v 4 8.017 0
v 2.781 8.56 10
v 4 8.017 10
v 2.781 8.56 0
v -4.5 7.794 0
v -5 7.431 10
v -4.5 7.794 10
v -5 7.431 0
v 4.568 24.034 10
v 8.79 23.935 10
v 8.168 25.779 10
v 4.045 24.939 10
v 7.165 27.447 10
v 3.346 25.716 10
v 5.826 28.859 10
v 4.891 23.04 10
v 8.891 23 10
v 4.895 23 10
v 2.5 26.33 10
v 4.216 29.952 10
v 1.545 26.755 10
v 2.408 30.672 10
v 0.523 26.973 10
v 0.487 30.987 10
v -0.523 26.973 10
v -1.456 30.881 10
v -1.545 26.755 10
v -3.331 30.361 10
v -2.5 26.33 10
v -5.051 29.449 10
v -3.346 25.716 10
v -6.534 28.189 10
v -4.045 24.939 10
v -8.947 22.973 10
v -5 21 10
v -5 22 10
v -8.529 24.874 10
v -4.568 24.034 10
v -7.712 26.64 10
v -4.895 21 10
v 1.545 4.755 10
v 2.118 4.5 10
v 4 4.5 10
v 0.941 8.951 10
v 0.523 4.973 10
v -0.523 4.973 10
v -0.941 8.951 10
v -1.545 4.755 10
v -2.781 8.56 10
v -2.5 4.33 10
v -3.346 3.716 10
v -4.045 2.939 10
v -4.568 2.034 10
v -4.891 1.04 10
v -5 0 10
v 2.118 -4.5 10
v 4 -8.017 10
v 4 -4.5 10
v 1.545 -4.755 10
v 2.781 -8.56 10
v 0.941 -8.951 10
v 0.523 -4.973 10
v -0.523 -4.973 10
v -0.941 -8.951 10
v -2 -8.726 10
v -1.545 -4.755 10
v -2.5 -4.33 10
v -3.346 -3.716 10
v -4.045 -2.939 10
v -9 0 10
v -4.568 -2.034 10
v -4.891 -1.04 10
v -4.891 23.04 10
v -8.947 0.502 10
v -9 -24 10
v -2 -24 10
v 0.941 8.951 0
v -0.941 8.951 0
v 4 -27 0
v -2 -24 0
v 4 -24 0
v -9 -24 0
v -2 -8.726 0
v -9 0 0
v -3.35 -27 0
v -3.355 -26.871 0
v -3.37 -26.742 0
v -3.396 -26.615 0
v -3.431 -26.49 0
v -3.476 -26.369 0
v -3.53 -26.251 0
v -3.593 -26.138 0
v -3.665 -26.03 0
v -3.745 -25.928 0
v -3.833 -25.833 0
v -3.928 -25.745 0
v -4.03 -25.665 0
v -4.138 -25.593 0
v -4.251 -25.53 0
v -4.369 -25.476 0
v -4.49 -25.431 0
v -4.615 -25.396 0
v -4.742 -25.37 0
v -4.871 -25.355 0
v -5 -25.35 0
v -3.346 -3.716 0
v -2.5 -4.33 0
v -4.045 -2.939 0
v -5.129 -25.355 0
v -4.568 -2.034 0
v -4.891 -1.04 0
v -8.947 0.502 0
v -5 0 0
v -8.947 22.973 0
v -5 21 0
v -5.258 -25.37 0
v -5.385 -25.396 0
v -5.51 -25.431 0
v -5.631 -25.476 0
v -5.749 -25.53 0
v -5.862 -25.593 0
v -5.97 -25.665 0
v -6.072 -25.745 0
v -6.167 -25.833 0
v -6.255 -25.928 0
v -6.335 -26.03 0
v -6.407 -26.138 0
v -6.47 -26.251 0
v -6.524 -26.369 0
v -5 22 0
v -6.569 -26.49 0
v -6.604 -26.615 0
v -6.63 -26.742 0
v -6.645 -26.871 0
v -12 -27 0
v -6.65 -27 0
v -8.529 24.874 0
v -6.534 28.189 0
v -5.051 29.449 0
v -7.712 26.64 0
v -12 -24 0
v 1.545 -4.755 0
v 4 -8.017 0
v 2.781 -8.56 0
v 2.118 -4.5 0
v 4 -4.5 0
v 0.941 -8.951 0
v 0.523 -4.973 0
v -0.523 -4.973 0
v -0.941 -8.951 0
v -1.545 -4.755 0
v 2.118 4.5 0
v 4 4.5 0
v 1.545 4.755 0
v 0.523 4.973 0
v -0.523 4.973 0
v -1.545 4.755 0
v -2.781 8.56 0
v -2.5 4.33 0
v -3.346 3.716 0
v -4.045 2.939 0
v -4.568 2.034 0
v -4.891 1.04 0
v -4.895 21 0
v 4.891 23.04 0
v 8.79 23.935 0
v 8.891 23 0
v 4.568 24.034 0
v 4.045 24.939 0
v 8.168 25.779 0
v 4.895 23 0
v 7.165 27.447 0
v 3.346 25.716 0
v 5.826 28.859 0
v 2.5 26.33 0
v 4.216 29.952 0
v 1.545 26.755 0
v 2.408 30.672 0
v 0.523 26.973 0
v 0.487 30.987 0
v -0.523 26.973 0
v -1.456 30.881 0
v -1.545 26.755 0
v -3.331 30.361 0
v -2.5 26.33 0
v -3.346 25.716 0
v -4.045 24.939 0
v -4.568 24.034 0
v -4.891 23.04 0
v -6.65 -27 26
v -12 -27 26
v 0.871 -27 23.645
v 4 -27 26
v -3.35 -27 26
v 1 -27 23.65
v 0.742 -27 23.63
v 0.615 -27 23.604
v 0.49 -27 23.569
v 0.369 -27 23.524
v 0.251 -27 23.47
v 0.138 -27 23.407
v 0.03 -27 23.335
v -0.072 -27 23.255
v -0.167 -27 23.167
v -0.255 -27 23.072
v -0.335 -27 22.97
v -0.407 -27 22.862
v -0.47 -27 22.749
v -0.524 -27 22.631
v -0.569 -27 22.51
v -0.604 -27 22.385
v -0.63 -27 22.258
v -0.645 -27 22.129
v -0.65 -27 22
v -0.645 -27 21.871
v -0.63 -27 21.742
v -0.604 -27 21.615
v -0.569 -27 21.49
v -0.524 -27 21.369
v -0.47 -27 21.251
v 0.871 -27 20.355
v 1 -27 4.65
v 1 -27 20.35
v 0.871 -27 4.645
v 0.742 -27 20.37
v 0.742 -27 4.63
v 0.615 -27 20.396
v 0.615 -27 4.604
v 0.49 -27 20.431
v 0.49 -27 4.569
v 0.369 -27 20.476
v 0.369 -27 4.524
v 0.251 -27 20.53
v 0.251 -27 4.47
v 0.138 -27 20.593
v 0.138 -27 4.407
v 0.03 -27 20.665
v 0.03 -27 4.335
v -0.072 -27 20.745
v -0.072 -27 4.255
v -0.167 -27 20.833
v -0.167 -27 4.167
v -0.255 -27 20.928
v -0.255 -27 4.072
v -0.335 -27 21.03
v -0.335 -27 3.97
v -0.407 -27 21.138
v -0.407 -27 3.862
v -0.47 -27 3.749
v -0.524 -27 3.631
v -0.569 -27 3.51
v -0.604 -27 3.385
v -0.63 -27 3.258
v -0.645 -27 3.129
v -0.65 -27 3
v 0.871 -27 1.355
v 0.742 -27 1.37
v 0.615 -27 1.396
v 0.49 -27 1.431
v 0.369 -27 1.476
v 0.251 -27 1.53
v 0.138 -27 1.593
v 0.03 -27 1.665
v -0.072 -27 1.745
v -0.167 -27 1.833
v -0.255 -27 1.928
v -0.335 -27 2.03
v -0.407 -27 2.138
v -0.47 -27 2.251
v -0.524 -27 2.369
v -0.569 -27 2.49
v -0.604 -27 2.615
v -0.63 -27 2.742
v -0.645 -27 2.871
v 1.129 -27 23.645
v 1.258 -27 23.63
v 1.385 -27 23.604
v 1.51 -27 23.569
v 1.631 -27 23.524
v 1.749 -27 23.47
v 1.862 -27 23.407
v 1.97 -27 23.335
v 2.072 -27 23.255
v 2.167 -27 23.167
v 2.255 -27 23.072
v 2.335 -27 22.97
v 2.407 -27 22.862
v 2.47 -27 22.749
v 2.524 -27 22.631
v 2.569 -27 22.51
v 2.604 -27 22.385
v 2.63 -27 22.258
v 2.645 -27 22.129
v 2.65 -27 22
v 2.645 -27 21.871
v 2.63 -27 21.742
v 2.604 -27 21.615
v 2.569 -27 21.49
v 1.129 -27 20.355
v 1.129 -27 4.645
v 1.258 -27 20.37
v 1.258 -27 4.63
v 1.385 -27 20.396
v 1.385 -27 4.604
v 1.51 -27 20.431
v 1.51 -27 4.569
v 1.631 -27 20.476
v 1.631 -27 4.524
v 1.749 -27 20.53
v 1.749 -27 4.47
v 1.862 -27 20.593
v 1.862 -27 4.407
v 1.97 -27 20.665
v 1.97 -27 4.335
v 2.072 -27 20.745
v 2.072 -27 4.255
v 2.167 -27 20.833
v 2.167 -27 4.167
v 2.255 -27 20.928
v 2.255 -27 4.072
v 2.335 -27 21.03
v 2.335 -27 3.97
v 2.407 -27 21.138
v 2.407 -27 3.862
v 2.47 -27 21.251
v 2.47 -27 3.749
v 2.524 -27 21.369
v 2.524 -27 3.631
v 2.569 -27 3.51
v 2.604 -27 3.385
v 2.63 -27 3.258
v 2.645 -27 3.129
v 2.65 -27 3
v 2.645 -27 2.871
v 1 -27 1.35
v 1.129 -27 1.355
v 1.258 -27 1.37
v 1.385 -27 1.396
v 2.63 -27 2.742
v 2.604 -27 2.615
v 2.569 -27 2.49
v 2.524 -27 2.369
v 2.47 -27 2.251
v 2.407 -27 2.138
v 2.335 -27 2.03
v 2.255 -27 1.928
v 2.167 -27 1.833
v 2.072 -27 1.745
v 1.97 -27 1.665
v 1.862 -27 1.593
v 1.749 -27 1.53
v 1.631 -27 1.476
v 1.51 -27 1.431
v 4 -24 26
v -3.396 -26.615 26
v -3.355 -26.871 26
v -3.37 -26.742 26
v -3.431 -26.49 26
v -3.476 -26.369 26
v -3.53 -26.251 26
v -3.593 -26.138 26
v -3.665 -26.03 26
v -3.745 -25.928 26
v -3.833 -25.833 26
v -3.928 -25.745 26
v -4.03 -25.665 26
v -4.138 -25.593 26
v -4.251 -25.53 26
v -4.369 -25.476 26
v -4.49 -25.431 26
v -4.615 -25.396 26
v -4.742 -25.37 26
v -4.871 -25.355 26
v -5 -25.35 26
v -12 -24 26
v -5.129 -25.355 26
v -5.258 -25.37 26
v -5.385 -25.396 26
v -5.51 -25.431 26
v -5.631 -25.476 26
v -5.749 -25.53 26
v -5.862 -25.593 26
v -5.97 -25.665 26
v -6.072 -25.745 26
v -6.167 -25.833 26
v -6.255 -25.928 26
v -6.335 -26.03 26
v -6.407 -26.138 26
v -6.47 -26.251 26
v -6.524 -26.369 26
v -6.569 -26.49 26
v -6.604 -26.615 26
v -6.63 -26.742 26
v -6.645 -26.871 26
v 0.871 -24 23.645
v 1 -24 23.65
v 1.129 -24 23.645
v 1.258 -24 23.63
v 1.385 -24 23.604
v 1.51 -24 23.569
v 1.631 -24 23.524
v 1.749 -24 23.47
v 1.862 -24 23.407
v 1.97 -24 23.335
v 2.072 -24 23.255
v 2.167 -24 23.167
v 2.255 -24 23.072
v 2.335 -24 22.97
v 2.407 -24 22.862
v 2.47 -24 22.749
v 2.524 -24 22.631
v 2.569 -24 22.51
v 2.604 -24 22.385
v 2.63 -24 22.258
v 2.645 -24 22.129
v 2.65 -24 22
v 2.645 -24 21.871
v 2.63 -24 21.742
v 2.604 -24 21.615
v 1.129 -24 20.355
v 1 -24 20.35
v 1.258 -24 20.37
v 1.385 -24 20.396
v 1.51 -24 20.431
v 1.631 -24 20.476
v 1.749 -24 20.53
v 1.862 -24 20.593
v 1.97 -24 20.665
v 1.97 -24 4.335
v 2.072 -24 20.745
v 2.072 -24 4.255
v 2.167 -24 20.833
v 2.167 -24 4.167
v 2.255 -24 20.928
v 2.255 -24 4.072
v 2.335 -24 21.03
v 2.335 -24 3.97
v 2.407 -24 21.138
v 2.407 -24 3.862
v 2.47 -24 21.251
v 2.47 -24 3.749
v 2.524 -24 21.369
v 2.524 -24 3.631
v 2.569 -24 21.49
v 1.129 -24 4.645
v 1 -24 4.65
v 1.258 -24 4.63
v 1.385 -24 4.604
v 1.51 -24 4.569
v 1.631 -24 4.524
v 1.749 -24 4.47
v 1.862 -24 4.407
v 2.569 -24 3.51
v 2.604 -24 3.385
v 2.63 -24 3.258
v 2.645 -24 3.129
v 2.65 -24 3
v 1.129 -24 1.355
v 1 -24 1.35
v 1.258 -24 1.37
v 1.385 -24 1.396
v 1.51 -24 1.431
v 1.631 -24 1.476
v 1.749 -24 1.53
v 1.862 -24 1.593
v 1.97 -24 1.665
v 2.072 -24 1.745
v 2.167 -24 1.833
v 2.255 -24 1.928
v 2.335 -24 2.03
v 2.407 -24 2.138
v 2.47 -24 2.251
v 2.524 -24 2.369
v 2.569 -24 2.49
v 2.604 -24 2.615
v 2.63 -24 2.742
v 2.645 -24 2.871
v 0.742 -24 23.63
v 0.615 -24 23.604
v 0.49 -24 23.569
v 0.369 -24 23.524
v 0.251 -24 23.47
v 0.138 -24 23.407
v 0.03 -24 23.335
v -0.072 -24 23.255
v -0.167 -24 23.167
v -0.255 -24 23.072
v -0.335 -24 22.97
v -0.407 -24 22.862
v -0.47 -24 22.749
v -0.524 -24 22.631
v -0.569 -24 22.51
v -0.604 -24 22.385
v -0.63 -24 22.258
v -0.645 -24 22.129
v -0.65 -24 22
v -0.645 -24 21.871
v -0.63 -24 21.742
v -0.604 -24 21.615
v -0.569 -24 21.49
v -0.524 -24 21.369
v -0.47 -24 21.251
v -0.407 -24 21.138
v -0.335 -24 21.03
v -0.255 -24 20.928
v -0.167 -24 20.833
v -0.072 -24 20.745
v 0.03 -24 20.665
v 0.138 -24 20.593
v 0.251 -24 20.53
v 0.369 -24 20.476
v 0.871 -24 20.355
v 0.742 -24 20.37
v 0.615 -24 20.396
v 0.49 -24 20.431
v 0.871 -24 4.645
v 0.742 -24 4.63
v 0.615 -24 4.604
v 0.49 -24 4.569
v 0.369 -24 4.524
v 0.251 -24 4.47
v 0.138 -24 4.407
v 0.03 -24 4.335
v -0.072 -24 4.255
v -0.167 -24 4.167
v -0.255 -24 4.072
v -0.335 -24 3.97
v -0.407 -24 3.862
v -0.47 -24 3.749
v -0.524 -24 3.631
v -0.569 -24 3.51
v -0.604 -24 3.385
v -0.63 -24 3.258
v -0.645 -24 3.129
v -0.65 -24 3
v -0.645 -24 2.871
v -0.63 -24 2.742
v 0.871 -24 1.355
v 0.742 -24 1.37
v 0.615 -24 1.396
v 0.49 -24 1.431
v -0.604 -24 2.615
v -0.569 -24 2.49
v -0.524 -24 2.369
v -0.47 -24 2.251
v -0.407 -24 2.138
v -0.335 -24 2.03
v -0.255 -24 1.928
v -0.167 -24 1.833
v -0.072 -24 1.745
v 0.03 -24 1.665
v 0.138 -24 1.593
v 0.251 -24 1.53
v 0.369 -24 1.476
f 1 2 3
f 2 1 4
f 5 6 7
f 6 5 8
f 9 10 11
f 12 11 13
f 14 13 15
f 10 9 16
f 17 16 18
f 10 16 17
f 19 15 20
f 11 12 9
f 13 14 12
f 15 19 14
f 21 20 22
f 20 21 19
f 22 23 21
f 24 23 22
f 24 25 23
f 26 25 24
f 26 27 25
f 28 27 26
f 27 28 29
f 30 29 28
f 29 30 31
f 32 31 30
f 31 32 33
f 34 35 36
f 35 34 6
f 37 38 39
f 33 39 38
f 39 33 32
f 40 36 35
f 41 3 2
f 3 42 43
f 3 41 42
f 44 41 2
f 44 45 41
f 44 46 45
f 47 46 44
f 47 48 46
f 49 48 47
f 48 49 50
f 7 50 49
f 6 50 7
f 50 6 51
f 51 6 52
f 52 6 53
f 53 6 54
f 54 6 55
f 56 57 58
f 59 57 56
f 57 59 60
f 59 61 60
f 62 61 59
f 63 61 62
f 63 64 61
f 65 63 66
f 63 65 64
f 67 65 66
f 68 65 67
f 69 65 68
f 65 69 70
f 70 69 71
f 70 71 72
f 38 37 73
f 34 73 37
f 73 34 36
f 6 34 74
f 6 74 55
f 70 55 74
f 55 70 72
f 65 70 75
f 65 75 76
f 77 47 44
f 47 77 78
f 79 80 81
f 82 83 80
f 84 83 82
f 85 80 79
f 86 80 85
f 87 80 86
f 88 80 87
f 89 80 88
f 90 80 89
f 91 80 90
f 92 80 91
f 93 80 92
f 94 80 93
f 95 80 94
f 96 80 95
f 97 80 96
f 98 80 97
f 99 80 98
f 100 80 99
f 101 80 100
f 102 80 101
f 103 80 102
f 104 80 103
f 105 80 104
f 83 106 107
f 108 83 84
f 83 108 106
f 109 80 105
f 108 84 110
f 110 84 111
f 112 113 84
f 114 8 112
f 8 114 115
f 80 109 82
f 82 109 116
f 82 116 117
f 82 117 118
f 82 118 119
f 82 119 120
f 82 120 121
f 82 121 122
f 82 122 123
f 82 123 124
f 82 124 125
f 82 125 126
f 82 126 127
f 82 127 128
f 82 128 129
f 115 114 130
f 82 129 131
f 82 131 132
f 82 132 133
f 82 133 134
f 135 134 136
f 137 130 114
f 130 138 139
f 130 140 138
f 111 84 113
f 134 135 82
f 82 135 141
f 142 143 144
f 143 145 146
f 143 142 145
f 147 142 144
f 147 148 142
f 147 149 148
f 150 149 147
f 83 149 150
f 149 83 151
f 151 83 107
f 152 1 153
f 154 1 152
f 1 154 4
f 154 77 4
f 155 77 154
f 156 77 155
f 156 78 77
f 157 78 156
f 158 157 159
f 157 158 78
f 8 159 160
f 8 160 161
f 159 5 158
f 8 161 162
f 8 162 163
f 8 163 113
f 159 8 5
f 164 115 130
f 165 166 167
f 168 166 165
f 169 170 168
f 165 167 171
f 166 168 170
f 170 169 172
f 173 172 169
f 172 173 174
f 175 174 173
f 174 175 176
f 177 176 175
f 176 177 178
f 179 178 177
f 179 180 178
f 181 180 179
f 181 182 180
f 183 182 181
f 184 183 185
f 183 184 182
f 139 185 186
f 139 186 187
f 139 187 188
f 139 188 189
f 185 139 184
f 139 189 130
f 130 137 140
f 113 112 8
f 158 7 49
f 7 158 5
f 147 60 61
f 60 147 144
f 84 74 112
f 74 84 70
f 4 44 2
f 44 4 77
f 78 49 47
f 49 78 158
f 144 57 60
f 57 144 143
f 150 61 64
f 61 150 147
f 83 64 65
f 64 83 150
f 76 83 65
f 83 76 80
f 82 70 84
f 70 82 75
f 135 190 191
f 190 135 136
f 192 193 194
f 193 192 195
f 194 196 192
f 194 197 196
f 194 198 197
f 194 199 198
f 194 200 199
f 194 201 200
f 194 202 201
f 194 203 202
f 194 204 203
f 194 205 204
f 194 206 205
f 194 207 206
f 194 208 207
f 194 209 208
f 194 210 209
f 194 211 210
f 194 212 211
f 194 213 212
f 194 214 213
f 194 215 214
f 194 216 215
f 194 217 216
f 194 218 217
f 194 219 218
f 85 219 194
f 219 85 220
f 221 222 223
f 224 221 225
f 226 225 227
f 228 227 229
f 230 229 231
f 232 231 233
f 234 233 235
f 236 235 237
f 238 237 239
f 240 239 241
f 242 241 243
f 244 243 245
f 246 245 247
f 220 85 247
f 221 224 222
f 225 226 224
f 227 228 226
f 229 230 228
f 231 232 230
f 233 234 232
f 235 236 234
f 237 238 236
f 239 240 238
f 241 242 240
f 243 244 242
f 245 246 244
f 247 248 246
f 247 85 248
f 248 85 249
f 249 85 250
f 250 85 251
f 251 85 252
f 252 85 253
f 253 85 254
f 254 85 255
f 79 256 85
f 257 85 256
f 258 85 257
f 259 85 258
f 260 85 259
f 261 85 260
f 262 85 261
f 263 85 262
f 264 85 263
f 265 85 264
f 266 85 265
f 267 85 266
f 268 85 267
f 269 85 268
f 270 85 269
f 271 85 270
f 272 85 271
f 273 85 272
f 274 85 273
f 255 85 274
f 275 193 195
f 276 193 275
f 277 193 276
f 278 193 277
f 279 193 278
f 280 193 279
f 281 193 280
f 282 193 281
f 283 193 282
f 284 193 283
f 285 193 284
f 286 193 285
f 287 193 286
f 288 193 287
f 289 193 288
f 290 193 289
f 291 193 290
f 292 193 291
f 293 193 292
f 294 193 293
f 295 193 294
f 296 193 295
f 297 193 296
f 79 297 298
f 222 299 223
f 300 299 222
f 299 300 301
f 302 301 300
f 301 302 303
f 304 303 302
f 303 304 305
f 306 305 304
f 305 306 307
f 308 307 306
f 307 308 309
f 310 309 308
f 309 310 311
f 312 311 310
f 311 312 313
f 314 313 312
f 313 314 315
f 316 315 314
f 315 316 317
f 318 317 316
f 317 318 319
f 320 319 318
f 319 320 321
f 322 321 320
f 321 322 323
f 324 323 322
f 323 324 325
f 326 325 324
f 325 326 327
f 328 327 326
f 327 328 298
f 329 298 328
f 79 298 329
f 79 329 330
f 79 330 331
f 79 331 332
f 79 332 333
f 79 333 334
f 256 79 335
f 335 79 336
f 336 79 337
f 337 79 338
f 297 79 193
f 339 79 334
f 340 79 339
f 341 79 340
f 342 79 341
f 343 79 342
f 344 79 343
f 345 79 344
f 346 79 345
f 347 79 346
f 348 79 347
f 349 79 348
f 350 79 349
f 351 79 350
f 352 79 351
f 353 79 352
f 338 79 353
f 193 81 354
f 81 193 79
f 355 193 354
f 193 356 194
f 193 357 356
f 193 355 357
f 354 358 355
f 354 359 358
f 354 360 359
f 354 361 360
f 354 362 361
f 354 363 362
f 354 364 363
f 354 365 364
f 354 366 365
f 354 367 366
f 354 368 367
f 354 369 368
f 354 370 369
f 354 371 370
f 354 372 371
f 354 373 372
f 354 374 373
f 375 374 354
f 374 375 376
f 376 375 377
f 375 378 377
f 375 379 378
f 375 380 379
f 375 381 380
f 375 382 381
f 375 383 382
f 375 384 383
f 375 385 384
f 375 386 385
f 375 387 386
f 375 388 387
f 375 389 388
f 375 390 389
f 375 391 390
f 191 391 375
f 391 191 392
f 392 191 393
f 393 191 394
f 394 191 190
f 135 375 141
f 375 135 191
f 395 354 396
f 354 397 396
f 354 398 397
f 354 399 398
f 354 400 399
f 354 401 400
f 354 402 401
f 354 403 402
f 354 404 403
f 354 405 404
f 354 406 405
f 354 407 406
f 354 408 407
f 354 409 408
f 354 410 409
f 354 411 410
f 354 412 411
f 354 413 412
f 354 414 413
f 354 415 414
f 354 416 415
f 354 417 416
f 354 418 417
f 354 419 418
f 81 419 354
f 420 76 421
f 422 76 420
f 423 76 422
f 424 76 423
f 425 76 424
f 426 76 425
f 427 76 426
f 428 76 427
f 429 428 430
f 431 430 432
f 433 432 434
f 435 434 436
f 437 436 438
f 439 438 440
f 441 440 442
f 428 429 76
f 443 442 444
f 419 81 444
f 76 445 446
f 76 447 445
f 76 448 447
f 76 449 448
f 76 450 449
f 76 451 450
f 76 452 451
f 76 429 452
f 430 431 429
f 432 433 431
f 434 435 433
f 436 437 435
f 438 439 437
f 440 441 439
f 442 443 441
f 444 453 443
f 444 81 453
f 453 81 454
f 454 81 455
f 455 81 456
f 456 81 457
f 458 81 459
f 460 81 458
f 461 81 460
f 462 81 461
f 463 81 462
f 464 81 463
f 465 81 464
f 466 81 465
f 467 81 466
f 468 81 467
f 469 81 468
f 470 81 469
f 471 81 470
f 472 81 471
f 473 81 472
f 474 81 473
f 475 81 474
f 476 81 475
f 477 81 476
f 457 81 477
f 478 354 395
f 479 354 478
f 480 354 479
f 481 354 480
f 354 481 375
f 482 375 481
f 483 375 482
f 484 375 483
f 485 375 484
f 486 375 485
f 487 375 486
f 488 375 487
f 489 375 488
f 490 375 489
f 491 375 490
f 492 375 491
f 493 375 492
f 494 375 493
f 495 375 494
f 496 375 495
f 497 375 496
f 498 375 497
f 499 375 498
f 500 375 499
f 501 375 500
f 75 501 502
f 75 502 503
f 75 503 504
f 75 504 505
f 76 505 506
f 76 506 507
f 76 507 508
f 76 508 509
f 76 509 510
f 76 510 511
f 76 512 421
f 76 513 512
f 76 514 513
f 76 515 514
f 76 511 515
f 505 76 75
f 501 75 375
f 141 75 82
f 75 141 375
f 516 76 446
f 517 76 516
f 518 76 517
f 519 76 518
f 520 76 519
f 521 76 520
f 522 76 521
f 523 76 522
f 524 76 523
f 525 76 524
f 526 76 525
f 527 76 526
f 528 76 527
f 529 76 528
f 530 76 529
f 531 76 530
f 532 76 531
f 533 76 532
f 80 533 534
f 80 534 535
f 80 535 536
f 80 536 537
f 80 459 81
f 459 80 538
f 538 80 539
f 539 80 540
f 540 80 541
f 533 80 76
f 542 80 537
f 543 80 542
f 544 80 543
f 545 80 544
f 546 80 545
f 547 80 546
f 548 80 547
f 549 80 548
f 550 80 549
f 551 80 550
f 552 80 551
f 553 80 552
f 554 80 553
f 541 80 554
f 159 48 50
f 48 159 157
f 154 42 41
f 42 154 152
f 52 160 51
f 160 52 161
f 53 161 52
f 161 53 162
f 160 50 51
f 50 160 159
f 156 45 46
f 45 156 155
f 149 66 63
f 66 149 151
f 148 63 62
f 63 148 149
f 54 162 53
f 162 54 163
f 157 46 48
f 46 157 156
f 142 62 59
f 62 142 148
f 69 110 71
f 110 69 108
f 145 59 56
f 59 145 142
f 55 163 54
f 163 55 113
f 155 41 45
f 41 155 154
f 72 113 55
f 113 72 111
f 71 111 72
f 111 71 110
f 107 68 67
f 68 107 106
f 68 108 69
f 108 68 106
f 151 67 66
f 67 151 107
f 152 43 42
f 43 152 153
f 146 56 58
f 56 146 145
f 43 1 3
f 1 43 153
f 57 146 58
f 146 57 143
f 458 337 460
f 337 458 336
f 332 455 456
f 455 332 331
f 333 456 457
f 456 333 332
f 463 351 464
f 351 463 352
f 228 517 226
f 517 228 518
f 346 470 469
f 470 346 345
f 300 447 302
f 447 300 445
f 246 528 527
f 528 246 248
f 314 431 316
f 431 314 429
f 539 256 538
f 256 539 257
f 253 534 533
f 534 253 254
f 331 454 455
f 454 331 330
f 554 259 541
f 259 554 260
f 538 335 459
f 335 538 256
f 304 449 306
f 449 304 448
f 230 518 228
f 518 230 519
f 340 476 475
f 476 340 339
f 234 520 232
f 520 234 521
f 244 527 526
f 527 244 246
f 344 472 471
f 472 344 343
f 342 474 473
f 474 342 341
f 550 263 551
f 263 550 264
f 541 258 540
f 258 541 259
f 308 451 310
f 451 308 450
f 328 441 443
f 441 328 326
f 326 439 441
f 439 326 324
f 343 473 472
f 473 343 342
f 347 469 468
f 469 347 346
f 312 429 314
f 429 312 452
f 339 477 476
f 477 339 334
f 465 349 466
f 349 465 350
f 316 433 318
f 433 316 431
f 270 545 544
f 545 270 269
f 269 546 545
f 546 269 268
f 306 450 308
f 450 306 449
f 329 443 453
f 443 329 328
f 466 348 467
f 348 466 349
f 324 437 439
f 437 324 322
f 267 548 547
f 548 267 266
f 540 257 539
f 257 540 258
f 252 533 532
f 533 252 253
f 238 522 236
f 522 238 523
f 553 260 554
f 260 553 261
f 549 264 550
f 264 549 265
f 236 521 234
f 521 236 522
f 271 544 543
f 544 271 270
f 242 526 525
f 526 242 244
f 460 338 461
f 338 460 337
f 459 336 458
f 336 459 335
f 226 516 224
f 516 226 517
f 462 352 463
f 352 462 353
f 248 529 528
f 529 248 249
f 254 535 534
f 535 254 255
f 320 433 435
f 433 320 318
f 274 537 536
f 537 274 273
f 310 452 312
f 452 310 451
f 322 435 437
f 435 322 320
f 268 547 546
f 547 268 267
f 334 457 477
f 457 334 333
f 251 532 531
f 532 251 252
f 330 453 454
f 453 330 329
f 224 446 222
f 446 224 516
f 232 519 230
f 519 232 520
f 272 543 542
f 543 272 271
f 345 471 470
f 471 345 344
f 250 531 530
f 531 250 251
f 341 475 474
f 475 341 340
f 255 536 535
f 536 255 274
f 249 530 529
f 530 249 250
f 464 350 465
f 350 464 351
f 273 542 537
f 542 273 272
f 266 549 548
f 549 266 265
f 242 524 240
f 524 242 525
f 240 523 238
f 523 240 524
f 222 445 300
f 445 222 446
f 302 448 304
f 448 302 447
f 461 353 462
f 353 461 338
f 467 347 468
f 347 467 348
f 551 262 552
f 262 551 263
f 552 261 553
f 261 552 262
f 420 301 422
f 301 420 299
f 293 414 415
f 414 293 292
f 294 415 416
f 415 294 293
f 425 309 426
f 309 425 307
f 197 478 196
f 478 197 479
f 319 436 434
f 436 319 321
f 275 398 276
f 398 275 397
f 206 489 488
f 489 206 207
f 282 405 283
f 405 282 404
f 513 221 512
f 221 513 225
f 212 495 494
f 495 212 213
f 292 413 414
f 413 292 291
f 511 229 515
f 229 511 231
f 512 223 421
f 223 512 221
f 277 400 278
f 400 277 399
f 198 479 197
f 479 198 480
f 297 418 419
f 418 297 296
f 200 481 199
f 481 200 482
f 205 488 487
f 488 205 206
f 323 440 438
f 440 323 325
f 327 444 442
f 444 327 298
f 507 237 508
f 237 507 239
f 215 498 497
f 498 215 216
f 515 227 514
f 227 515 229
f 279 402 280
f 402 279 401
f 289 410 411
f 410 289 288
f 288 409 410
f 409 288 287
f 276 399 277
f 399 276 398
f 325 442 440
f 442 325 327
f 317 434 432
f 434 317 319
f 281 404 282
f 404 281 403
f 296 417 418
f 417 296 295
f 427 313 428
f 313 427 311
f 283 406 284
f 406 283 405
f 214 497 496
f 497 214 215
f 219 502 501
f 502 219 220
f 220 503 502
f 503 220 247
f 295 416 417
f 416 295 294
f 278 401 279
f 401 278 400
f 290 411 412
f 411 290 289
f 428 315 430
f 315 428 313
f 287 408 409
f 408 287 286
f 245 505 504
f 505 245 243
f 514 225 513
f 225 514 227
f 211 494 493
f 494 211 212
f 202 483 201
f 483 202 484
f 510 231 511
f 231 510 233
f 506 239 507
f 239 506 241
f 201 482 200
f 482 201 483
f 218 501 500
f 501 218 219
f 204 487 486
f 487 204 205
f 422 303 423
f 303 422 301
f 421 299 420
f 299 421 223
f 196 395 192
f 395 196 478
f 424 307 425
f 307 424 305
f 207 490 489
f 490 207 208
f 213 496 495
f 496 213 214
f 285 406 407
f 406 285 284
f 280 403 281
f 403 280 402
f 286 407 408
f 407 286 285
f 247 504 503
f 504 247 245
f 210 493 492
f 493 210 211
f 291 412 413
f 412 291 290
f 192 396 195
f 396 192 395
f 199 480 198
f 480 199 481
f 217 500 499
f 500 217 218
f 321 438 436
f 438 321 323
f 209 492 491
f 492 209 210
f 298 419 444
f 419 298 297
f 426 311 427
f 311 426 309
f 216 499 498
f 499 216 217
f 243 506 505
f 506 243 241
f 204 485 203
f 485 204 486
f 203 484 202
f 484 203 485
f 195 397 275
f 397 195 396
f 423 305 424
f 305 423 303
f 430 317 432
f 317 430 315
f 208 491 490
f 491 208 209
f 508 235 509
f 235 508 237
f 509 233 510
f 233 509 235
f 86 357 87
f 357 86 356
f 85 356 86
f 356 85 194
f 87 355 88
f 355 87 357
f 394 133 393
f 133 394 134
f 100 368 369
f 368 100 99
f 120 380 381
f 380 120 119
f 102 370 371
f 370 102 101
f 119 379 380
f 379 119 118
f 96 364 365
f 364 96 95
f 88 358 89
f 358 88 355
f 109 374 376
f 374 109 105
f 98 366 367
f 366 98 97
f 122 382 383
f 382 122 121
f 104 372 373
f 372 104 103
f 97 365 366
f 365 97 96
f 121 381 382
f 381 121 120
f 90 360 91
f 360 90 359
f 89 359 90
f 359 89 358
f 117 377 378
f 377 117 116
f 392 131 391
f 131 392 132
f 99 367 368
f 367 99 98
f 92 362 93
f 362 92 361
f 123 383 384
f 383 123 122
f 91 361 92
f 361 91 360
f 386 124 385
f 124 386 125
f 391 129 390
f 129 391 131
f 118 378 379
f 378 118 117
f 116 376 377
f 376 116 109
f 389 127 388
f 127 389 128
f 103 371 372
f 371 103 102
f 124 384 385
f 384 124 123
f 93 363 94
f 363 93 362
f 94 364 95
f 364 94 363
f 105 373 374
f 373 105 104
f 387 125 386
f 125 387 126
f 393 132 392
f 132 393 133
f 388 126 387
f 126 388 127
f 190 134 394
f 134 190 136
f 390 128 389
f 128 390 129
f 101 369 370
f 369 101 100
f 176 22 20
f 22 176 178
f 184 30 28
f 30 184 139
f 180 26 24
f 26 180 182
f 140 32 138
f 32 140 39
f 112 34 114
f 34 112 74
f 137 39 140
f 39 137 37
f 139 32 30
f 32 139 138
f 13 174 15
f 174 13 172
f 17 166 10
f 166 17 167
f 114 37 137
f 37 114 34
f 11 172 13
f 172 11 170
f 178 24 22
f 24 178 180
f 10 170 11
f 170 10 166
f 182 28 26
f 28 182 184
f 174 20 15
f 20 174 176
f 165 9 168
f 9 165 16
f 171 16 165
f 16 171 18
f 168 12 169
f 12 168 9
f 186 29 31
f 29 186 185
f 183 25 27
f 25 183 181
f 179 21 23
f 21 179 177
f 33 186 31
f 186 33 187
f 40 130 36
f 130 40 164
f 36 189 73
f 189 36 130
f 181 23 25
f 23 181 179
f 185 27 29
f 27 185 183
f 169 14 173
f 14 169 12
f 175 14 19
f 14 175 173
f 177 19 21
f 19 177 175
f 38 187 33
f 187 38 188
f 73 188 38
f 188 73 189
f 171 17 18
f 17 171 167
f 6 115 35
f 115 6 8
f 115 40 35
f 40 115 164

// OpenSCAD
// file: inc/rrd-switch.scad
module rrd_switch()
{
  $fn=80;
  difference() {
    union() {
      cube([40, 16, 1.55]);
      translate([-13/2+(36-19/2), 16-6.55, 1.55])
        cube([13, 6.55, 5.5]);
    }
    union() {
      for(y=[-11/2, 11/2])
      translate([2.3, 16/2+y, -1])
        cylinder(r=3.3/2, h=4);
      
      translate([36, 16-3, -1])
        cylinder(r=3.3/2, h=4);
      translate([36-19, 16-3, -1])
        cylinder(r=3.3/2, h=4);
    }
  }
}

rrd_switch();
// main file
use <inc/rrd-switch.scad>;

module y_clip() {

  thickness = 10;
  rod = 10;
  length = 30;

  difference() {
    union() {
      cylinder(r=9, h=thickness, $fn=30);
      
      translate([-18/2, -18-9, 0])
        cube([7, 18+9, thickness]);
      
      translate([-18/2-3, -18-9, 0])
        cube([16, 3, 26]);
    }
    union() {
      translate([0, 0, -1]) cylinder(r=rod/2, h=thickness+2, $fn=30);
      translate([0, -(rod - 1) / 2, 0]) cube([10, rod - 1, thickness]);
      translate([(rod / 2) - 1, -15, -1]) cube([10, 30, thickness+2]);
      
      translate([6+2-7, -20, 3])
        rotate([90, 0, 0])
        cylinder(r=3.3/2, h=10, $fn=80);
      translate([6+2-7, -20, 3+19])
        rotate([90, 0, 0])
        cylinder(r=3.3/2, h=10, $fn=80);
      
      translate([2-7, -27, 0])
        cylinder(r=3.3/2, h=30, $fn=80);
    }
  }

  translate([2, -9, 0]) difference() {
    hull() {
      translate(v = [-2,10-1,0]) cylinder(h = 10, r=9);
      translate(v = [-2,30+1,0]) cylinder(h = 10, r=9);
    }
    translate(v = [-2,10-1,-1]) cylinder(r=rod/2, h=thickness+2, $fn=30);	
    translate(v = [-2,30+1,-1]) cylinder(r=rod/2, h=thickness+2, $fn=30);
    translate([0,-8,-1]) cube([10,40,10+2]);
    translate([-7,-10,-1]) cube([10,40,10+2]);
  }
  
  translate([-12, -27, 39])
    rotate([90, 90, 0])
      %rrd_switch();
}

y_clip();

module x_clip() {
  thickness = 20;
  rod = 8.3;
  holes_distance = 19; // between the two screw holes on the switch.
  slit_height = 4;
  
  difference() {
    union() {
      translate([-3-rod/2,-(holes_distance+6)/2,0]) cube([4, holes_distance+6, thickness]);
      cylinder(r=rod/2 + 2, h=thickness);
    }
    cylinder(r=rod/2, h=thickness);
    translate([0,0,thickness-6]) difference() {
      cylinder(r=rod/2 + 4, h=slit_height);
      cylinder(r=rod/2 + 2, h=slit_height);
    }
    translate([0, -(rod - 1) / 2, 0]) cube([10, rod - 1, thickness]);
    translate([(rod / 2) - 1, -(rod + 4) / 2, 0]) cube([10, rod + 4, thickness]);

    for(i=[-1,1]) translate([-20,i*(holes_distance/2),4]) rotate([0,90,0]) cylinder(r = 4/2, h = 20);
    translate([-11,-15,9]) rotate([0,45,0]) cube([4,30,4]);
  }
}

*x_clip();

module z_clip() {
  thickness = 30;
  rod = 8.3;
  holes_distance = 19; // between the two screw holes on the switch.
  slit_height = 4;
  
  difference() {
    union() {
      translate([-3-rod/2,-(holes_distance+6)/2,0]) cube([4, holes_distance+6, thickness]);
      cylinder(r=rod/2 + 2, h=thickness);
    }
    cylinder(r=rod/2, h=thickness);
    #for(z=[thickness/2-slit_height/2, thickness-6]) translate([0,0,z]) difference() {
      cylinder(r=rod/2 + 4, h=slit_height);
      cylinder(r=rod/2 + 2, h=slit_height);
    }
    translate([0, -(rod - 1) / 2, 0]) cube([10, rod - 1, thickness]);
    translate([(rod / 2) - 1, -(rod + 4) / 2, 0]) cube([10, rod + 4, thickness]);

    for(i=[-1,1]) translate([-20,i*(holes_distance/2),4]) rotate([0,90,0]) cylinder(r = 4/2, h = 20);
    translate([-11,-15,9]) rotate([0,45,0]) cube([4,30,4]);
  }
}

*z_clip();


module z_cap() {
	difference() {
		cylinder(r=6/2,h=7, $fn=30);
		translate([0,0,2]) cylinder(r=3/2, h=7, $fn=30);
	}
	cylinder(r=12/2,h=2, $fn=30);
}

*z_cap();
